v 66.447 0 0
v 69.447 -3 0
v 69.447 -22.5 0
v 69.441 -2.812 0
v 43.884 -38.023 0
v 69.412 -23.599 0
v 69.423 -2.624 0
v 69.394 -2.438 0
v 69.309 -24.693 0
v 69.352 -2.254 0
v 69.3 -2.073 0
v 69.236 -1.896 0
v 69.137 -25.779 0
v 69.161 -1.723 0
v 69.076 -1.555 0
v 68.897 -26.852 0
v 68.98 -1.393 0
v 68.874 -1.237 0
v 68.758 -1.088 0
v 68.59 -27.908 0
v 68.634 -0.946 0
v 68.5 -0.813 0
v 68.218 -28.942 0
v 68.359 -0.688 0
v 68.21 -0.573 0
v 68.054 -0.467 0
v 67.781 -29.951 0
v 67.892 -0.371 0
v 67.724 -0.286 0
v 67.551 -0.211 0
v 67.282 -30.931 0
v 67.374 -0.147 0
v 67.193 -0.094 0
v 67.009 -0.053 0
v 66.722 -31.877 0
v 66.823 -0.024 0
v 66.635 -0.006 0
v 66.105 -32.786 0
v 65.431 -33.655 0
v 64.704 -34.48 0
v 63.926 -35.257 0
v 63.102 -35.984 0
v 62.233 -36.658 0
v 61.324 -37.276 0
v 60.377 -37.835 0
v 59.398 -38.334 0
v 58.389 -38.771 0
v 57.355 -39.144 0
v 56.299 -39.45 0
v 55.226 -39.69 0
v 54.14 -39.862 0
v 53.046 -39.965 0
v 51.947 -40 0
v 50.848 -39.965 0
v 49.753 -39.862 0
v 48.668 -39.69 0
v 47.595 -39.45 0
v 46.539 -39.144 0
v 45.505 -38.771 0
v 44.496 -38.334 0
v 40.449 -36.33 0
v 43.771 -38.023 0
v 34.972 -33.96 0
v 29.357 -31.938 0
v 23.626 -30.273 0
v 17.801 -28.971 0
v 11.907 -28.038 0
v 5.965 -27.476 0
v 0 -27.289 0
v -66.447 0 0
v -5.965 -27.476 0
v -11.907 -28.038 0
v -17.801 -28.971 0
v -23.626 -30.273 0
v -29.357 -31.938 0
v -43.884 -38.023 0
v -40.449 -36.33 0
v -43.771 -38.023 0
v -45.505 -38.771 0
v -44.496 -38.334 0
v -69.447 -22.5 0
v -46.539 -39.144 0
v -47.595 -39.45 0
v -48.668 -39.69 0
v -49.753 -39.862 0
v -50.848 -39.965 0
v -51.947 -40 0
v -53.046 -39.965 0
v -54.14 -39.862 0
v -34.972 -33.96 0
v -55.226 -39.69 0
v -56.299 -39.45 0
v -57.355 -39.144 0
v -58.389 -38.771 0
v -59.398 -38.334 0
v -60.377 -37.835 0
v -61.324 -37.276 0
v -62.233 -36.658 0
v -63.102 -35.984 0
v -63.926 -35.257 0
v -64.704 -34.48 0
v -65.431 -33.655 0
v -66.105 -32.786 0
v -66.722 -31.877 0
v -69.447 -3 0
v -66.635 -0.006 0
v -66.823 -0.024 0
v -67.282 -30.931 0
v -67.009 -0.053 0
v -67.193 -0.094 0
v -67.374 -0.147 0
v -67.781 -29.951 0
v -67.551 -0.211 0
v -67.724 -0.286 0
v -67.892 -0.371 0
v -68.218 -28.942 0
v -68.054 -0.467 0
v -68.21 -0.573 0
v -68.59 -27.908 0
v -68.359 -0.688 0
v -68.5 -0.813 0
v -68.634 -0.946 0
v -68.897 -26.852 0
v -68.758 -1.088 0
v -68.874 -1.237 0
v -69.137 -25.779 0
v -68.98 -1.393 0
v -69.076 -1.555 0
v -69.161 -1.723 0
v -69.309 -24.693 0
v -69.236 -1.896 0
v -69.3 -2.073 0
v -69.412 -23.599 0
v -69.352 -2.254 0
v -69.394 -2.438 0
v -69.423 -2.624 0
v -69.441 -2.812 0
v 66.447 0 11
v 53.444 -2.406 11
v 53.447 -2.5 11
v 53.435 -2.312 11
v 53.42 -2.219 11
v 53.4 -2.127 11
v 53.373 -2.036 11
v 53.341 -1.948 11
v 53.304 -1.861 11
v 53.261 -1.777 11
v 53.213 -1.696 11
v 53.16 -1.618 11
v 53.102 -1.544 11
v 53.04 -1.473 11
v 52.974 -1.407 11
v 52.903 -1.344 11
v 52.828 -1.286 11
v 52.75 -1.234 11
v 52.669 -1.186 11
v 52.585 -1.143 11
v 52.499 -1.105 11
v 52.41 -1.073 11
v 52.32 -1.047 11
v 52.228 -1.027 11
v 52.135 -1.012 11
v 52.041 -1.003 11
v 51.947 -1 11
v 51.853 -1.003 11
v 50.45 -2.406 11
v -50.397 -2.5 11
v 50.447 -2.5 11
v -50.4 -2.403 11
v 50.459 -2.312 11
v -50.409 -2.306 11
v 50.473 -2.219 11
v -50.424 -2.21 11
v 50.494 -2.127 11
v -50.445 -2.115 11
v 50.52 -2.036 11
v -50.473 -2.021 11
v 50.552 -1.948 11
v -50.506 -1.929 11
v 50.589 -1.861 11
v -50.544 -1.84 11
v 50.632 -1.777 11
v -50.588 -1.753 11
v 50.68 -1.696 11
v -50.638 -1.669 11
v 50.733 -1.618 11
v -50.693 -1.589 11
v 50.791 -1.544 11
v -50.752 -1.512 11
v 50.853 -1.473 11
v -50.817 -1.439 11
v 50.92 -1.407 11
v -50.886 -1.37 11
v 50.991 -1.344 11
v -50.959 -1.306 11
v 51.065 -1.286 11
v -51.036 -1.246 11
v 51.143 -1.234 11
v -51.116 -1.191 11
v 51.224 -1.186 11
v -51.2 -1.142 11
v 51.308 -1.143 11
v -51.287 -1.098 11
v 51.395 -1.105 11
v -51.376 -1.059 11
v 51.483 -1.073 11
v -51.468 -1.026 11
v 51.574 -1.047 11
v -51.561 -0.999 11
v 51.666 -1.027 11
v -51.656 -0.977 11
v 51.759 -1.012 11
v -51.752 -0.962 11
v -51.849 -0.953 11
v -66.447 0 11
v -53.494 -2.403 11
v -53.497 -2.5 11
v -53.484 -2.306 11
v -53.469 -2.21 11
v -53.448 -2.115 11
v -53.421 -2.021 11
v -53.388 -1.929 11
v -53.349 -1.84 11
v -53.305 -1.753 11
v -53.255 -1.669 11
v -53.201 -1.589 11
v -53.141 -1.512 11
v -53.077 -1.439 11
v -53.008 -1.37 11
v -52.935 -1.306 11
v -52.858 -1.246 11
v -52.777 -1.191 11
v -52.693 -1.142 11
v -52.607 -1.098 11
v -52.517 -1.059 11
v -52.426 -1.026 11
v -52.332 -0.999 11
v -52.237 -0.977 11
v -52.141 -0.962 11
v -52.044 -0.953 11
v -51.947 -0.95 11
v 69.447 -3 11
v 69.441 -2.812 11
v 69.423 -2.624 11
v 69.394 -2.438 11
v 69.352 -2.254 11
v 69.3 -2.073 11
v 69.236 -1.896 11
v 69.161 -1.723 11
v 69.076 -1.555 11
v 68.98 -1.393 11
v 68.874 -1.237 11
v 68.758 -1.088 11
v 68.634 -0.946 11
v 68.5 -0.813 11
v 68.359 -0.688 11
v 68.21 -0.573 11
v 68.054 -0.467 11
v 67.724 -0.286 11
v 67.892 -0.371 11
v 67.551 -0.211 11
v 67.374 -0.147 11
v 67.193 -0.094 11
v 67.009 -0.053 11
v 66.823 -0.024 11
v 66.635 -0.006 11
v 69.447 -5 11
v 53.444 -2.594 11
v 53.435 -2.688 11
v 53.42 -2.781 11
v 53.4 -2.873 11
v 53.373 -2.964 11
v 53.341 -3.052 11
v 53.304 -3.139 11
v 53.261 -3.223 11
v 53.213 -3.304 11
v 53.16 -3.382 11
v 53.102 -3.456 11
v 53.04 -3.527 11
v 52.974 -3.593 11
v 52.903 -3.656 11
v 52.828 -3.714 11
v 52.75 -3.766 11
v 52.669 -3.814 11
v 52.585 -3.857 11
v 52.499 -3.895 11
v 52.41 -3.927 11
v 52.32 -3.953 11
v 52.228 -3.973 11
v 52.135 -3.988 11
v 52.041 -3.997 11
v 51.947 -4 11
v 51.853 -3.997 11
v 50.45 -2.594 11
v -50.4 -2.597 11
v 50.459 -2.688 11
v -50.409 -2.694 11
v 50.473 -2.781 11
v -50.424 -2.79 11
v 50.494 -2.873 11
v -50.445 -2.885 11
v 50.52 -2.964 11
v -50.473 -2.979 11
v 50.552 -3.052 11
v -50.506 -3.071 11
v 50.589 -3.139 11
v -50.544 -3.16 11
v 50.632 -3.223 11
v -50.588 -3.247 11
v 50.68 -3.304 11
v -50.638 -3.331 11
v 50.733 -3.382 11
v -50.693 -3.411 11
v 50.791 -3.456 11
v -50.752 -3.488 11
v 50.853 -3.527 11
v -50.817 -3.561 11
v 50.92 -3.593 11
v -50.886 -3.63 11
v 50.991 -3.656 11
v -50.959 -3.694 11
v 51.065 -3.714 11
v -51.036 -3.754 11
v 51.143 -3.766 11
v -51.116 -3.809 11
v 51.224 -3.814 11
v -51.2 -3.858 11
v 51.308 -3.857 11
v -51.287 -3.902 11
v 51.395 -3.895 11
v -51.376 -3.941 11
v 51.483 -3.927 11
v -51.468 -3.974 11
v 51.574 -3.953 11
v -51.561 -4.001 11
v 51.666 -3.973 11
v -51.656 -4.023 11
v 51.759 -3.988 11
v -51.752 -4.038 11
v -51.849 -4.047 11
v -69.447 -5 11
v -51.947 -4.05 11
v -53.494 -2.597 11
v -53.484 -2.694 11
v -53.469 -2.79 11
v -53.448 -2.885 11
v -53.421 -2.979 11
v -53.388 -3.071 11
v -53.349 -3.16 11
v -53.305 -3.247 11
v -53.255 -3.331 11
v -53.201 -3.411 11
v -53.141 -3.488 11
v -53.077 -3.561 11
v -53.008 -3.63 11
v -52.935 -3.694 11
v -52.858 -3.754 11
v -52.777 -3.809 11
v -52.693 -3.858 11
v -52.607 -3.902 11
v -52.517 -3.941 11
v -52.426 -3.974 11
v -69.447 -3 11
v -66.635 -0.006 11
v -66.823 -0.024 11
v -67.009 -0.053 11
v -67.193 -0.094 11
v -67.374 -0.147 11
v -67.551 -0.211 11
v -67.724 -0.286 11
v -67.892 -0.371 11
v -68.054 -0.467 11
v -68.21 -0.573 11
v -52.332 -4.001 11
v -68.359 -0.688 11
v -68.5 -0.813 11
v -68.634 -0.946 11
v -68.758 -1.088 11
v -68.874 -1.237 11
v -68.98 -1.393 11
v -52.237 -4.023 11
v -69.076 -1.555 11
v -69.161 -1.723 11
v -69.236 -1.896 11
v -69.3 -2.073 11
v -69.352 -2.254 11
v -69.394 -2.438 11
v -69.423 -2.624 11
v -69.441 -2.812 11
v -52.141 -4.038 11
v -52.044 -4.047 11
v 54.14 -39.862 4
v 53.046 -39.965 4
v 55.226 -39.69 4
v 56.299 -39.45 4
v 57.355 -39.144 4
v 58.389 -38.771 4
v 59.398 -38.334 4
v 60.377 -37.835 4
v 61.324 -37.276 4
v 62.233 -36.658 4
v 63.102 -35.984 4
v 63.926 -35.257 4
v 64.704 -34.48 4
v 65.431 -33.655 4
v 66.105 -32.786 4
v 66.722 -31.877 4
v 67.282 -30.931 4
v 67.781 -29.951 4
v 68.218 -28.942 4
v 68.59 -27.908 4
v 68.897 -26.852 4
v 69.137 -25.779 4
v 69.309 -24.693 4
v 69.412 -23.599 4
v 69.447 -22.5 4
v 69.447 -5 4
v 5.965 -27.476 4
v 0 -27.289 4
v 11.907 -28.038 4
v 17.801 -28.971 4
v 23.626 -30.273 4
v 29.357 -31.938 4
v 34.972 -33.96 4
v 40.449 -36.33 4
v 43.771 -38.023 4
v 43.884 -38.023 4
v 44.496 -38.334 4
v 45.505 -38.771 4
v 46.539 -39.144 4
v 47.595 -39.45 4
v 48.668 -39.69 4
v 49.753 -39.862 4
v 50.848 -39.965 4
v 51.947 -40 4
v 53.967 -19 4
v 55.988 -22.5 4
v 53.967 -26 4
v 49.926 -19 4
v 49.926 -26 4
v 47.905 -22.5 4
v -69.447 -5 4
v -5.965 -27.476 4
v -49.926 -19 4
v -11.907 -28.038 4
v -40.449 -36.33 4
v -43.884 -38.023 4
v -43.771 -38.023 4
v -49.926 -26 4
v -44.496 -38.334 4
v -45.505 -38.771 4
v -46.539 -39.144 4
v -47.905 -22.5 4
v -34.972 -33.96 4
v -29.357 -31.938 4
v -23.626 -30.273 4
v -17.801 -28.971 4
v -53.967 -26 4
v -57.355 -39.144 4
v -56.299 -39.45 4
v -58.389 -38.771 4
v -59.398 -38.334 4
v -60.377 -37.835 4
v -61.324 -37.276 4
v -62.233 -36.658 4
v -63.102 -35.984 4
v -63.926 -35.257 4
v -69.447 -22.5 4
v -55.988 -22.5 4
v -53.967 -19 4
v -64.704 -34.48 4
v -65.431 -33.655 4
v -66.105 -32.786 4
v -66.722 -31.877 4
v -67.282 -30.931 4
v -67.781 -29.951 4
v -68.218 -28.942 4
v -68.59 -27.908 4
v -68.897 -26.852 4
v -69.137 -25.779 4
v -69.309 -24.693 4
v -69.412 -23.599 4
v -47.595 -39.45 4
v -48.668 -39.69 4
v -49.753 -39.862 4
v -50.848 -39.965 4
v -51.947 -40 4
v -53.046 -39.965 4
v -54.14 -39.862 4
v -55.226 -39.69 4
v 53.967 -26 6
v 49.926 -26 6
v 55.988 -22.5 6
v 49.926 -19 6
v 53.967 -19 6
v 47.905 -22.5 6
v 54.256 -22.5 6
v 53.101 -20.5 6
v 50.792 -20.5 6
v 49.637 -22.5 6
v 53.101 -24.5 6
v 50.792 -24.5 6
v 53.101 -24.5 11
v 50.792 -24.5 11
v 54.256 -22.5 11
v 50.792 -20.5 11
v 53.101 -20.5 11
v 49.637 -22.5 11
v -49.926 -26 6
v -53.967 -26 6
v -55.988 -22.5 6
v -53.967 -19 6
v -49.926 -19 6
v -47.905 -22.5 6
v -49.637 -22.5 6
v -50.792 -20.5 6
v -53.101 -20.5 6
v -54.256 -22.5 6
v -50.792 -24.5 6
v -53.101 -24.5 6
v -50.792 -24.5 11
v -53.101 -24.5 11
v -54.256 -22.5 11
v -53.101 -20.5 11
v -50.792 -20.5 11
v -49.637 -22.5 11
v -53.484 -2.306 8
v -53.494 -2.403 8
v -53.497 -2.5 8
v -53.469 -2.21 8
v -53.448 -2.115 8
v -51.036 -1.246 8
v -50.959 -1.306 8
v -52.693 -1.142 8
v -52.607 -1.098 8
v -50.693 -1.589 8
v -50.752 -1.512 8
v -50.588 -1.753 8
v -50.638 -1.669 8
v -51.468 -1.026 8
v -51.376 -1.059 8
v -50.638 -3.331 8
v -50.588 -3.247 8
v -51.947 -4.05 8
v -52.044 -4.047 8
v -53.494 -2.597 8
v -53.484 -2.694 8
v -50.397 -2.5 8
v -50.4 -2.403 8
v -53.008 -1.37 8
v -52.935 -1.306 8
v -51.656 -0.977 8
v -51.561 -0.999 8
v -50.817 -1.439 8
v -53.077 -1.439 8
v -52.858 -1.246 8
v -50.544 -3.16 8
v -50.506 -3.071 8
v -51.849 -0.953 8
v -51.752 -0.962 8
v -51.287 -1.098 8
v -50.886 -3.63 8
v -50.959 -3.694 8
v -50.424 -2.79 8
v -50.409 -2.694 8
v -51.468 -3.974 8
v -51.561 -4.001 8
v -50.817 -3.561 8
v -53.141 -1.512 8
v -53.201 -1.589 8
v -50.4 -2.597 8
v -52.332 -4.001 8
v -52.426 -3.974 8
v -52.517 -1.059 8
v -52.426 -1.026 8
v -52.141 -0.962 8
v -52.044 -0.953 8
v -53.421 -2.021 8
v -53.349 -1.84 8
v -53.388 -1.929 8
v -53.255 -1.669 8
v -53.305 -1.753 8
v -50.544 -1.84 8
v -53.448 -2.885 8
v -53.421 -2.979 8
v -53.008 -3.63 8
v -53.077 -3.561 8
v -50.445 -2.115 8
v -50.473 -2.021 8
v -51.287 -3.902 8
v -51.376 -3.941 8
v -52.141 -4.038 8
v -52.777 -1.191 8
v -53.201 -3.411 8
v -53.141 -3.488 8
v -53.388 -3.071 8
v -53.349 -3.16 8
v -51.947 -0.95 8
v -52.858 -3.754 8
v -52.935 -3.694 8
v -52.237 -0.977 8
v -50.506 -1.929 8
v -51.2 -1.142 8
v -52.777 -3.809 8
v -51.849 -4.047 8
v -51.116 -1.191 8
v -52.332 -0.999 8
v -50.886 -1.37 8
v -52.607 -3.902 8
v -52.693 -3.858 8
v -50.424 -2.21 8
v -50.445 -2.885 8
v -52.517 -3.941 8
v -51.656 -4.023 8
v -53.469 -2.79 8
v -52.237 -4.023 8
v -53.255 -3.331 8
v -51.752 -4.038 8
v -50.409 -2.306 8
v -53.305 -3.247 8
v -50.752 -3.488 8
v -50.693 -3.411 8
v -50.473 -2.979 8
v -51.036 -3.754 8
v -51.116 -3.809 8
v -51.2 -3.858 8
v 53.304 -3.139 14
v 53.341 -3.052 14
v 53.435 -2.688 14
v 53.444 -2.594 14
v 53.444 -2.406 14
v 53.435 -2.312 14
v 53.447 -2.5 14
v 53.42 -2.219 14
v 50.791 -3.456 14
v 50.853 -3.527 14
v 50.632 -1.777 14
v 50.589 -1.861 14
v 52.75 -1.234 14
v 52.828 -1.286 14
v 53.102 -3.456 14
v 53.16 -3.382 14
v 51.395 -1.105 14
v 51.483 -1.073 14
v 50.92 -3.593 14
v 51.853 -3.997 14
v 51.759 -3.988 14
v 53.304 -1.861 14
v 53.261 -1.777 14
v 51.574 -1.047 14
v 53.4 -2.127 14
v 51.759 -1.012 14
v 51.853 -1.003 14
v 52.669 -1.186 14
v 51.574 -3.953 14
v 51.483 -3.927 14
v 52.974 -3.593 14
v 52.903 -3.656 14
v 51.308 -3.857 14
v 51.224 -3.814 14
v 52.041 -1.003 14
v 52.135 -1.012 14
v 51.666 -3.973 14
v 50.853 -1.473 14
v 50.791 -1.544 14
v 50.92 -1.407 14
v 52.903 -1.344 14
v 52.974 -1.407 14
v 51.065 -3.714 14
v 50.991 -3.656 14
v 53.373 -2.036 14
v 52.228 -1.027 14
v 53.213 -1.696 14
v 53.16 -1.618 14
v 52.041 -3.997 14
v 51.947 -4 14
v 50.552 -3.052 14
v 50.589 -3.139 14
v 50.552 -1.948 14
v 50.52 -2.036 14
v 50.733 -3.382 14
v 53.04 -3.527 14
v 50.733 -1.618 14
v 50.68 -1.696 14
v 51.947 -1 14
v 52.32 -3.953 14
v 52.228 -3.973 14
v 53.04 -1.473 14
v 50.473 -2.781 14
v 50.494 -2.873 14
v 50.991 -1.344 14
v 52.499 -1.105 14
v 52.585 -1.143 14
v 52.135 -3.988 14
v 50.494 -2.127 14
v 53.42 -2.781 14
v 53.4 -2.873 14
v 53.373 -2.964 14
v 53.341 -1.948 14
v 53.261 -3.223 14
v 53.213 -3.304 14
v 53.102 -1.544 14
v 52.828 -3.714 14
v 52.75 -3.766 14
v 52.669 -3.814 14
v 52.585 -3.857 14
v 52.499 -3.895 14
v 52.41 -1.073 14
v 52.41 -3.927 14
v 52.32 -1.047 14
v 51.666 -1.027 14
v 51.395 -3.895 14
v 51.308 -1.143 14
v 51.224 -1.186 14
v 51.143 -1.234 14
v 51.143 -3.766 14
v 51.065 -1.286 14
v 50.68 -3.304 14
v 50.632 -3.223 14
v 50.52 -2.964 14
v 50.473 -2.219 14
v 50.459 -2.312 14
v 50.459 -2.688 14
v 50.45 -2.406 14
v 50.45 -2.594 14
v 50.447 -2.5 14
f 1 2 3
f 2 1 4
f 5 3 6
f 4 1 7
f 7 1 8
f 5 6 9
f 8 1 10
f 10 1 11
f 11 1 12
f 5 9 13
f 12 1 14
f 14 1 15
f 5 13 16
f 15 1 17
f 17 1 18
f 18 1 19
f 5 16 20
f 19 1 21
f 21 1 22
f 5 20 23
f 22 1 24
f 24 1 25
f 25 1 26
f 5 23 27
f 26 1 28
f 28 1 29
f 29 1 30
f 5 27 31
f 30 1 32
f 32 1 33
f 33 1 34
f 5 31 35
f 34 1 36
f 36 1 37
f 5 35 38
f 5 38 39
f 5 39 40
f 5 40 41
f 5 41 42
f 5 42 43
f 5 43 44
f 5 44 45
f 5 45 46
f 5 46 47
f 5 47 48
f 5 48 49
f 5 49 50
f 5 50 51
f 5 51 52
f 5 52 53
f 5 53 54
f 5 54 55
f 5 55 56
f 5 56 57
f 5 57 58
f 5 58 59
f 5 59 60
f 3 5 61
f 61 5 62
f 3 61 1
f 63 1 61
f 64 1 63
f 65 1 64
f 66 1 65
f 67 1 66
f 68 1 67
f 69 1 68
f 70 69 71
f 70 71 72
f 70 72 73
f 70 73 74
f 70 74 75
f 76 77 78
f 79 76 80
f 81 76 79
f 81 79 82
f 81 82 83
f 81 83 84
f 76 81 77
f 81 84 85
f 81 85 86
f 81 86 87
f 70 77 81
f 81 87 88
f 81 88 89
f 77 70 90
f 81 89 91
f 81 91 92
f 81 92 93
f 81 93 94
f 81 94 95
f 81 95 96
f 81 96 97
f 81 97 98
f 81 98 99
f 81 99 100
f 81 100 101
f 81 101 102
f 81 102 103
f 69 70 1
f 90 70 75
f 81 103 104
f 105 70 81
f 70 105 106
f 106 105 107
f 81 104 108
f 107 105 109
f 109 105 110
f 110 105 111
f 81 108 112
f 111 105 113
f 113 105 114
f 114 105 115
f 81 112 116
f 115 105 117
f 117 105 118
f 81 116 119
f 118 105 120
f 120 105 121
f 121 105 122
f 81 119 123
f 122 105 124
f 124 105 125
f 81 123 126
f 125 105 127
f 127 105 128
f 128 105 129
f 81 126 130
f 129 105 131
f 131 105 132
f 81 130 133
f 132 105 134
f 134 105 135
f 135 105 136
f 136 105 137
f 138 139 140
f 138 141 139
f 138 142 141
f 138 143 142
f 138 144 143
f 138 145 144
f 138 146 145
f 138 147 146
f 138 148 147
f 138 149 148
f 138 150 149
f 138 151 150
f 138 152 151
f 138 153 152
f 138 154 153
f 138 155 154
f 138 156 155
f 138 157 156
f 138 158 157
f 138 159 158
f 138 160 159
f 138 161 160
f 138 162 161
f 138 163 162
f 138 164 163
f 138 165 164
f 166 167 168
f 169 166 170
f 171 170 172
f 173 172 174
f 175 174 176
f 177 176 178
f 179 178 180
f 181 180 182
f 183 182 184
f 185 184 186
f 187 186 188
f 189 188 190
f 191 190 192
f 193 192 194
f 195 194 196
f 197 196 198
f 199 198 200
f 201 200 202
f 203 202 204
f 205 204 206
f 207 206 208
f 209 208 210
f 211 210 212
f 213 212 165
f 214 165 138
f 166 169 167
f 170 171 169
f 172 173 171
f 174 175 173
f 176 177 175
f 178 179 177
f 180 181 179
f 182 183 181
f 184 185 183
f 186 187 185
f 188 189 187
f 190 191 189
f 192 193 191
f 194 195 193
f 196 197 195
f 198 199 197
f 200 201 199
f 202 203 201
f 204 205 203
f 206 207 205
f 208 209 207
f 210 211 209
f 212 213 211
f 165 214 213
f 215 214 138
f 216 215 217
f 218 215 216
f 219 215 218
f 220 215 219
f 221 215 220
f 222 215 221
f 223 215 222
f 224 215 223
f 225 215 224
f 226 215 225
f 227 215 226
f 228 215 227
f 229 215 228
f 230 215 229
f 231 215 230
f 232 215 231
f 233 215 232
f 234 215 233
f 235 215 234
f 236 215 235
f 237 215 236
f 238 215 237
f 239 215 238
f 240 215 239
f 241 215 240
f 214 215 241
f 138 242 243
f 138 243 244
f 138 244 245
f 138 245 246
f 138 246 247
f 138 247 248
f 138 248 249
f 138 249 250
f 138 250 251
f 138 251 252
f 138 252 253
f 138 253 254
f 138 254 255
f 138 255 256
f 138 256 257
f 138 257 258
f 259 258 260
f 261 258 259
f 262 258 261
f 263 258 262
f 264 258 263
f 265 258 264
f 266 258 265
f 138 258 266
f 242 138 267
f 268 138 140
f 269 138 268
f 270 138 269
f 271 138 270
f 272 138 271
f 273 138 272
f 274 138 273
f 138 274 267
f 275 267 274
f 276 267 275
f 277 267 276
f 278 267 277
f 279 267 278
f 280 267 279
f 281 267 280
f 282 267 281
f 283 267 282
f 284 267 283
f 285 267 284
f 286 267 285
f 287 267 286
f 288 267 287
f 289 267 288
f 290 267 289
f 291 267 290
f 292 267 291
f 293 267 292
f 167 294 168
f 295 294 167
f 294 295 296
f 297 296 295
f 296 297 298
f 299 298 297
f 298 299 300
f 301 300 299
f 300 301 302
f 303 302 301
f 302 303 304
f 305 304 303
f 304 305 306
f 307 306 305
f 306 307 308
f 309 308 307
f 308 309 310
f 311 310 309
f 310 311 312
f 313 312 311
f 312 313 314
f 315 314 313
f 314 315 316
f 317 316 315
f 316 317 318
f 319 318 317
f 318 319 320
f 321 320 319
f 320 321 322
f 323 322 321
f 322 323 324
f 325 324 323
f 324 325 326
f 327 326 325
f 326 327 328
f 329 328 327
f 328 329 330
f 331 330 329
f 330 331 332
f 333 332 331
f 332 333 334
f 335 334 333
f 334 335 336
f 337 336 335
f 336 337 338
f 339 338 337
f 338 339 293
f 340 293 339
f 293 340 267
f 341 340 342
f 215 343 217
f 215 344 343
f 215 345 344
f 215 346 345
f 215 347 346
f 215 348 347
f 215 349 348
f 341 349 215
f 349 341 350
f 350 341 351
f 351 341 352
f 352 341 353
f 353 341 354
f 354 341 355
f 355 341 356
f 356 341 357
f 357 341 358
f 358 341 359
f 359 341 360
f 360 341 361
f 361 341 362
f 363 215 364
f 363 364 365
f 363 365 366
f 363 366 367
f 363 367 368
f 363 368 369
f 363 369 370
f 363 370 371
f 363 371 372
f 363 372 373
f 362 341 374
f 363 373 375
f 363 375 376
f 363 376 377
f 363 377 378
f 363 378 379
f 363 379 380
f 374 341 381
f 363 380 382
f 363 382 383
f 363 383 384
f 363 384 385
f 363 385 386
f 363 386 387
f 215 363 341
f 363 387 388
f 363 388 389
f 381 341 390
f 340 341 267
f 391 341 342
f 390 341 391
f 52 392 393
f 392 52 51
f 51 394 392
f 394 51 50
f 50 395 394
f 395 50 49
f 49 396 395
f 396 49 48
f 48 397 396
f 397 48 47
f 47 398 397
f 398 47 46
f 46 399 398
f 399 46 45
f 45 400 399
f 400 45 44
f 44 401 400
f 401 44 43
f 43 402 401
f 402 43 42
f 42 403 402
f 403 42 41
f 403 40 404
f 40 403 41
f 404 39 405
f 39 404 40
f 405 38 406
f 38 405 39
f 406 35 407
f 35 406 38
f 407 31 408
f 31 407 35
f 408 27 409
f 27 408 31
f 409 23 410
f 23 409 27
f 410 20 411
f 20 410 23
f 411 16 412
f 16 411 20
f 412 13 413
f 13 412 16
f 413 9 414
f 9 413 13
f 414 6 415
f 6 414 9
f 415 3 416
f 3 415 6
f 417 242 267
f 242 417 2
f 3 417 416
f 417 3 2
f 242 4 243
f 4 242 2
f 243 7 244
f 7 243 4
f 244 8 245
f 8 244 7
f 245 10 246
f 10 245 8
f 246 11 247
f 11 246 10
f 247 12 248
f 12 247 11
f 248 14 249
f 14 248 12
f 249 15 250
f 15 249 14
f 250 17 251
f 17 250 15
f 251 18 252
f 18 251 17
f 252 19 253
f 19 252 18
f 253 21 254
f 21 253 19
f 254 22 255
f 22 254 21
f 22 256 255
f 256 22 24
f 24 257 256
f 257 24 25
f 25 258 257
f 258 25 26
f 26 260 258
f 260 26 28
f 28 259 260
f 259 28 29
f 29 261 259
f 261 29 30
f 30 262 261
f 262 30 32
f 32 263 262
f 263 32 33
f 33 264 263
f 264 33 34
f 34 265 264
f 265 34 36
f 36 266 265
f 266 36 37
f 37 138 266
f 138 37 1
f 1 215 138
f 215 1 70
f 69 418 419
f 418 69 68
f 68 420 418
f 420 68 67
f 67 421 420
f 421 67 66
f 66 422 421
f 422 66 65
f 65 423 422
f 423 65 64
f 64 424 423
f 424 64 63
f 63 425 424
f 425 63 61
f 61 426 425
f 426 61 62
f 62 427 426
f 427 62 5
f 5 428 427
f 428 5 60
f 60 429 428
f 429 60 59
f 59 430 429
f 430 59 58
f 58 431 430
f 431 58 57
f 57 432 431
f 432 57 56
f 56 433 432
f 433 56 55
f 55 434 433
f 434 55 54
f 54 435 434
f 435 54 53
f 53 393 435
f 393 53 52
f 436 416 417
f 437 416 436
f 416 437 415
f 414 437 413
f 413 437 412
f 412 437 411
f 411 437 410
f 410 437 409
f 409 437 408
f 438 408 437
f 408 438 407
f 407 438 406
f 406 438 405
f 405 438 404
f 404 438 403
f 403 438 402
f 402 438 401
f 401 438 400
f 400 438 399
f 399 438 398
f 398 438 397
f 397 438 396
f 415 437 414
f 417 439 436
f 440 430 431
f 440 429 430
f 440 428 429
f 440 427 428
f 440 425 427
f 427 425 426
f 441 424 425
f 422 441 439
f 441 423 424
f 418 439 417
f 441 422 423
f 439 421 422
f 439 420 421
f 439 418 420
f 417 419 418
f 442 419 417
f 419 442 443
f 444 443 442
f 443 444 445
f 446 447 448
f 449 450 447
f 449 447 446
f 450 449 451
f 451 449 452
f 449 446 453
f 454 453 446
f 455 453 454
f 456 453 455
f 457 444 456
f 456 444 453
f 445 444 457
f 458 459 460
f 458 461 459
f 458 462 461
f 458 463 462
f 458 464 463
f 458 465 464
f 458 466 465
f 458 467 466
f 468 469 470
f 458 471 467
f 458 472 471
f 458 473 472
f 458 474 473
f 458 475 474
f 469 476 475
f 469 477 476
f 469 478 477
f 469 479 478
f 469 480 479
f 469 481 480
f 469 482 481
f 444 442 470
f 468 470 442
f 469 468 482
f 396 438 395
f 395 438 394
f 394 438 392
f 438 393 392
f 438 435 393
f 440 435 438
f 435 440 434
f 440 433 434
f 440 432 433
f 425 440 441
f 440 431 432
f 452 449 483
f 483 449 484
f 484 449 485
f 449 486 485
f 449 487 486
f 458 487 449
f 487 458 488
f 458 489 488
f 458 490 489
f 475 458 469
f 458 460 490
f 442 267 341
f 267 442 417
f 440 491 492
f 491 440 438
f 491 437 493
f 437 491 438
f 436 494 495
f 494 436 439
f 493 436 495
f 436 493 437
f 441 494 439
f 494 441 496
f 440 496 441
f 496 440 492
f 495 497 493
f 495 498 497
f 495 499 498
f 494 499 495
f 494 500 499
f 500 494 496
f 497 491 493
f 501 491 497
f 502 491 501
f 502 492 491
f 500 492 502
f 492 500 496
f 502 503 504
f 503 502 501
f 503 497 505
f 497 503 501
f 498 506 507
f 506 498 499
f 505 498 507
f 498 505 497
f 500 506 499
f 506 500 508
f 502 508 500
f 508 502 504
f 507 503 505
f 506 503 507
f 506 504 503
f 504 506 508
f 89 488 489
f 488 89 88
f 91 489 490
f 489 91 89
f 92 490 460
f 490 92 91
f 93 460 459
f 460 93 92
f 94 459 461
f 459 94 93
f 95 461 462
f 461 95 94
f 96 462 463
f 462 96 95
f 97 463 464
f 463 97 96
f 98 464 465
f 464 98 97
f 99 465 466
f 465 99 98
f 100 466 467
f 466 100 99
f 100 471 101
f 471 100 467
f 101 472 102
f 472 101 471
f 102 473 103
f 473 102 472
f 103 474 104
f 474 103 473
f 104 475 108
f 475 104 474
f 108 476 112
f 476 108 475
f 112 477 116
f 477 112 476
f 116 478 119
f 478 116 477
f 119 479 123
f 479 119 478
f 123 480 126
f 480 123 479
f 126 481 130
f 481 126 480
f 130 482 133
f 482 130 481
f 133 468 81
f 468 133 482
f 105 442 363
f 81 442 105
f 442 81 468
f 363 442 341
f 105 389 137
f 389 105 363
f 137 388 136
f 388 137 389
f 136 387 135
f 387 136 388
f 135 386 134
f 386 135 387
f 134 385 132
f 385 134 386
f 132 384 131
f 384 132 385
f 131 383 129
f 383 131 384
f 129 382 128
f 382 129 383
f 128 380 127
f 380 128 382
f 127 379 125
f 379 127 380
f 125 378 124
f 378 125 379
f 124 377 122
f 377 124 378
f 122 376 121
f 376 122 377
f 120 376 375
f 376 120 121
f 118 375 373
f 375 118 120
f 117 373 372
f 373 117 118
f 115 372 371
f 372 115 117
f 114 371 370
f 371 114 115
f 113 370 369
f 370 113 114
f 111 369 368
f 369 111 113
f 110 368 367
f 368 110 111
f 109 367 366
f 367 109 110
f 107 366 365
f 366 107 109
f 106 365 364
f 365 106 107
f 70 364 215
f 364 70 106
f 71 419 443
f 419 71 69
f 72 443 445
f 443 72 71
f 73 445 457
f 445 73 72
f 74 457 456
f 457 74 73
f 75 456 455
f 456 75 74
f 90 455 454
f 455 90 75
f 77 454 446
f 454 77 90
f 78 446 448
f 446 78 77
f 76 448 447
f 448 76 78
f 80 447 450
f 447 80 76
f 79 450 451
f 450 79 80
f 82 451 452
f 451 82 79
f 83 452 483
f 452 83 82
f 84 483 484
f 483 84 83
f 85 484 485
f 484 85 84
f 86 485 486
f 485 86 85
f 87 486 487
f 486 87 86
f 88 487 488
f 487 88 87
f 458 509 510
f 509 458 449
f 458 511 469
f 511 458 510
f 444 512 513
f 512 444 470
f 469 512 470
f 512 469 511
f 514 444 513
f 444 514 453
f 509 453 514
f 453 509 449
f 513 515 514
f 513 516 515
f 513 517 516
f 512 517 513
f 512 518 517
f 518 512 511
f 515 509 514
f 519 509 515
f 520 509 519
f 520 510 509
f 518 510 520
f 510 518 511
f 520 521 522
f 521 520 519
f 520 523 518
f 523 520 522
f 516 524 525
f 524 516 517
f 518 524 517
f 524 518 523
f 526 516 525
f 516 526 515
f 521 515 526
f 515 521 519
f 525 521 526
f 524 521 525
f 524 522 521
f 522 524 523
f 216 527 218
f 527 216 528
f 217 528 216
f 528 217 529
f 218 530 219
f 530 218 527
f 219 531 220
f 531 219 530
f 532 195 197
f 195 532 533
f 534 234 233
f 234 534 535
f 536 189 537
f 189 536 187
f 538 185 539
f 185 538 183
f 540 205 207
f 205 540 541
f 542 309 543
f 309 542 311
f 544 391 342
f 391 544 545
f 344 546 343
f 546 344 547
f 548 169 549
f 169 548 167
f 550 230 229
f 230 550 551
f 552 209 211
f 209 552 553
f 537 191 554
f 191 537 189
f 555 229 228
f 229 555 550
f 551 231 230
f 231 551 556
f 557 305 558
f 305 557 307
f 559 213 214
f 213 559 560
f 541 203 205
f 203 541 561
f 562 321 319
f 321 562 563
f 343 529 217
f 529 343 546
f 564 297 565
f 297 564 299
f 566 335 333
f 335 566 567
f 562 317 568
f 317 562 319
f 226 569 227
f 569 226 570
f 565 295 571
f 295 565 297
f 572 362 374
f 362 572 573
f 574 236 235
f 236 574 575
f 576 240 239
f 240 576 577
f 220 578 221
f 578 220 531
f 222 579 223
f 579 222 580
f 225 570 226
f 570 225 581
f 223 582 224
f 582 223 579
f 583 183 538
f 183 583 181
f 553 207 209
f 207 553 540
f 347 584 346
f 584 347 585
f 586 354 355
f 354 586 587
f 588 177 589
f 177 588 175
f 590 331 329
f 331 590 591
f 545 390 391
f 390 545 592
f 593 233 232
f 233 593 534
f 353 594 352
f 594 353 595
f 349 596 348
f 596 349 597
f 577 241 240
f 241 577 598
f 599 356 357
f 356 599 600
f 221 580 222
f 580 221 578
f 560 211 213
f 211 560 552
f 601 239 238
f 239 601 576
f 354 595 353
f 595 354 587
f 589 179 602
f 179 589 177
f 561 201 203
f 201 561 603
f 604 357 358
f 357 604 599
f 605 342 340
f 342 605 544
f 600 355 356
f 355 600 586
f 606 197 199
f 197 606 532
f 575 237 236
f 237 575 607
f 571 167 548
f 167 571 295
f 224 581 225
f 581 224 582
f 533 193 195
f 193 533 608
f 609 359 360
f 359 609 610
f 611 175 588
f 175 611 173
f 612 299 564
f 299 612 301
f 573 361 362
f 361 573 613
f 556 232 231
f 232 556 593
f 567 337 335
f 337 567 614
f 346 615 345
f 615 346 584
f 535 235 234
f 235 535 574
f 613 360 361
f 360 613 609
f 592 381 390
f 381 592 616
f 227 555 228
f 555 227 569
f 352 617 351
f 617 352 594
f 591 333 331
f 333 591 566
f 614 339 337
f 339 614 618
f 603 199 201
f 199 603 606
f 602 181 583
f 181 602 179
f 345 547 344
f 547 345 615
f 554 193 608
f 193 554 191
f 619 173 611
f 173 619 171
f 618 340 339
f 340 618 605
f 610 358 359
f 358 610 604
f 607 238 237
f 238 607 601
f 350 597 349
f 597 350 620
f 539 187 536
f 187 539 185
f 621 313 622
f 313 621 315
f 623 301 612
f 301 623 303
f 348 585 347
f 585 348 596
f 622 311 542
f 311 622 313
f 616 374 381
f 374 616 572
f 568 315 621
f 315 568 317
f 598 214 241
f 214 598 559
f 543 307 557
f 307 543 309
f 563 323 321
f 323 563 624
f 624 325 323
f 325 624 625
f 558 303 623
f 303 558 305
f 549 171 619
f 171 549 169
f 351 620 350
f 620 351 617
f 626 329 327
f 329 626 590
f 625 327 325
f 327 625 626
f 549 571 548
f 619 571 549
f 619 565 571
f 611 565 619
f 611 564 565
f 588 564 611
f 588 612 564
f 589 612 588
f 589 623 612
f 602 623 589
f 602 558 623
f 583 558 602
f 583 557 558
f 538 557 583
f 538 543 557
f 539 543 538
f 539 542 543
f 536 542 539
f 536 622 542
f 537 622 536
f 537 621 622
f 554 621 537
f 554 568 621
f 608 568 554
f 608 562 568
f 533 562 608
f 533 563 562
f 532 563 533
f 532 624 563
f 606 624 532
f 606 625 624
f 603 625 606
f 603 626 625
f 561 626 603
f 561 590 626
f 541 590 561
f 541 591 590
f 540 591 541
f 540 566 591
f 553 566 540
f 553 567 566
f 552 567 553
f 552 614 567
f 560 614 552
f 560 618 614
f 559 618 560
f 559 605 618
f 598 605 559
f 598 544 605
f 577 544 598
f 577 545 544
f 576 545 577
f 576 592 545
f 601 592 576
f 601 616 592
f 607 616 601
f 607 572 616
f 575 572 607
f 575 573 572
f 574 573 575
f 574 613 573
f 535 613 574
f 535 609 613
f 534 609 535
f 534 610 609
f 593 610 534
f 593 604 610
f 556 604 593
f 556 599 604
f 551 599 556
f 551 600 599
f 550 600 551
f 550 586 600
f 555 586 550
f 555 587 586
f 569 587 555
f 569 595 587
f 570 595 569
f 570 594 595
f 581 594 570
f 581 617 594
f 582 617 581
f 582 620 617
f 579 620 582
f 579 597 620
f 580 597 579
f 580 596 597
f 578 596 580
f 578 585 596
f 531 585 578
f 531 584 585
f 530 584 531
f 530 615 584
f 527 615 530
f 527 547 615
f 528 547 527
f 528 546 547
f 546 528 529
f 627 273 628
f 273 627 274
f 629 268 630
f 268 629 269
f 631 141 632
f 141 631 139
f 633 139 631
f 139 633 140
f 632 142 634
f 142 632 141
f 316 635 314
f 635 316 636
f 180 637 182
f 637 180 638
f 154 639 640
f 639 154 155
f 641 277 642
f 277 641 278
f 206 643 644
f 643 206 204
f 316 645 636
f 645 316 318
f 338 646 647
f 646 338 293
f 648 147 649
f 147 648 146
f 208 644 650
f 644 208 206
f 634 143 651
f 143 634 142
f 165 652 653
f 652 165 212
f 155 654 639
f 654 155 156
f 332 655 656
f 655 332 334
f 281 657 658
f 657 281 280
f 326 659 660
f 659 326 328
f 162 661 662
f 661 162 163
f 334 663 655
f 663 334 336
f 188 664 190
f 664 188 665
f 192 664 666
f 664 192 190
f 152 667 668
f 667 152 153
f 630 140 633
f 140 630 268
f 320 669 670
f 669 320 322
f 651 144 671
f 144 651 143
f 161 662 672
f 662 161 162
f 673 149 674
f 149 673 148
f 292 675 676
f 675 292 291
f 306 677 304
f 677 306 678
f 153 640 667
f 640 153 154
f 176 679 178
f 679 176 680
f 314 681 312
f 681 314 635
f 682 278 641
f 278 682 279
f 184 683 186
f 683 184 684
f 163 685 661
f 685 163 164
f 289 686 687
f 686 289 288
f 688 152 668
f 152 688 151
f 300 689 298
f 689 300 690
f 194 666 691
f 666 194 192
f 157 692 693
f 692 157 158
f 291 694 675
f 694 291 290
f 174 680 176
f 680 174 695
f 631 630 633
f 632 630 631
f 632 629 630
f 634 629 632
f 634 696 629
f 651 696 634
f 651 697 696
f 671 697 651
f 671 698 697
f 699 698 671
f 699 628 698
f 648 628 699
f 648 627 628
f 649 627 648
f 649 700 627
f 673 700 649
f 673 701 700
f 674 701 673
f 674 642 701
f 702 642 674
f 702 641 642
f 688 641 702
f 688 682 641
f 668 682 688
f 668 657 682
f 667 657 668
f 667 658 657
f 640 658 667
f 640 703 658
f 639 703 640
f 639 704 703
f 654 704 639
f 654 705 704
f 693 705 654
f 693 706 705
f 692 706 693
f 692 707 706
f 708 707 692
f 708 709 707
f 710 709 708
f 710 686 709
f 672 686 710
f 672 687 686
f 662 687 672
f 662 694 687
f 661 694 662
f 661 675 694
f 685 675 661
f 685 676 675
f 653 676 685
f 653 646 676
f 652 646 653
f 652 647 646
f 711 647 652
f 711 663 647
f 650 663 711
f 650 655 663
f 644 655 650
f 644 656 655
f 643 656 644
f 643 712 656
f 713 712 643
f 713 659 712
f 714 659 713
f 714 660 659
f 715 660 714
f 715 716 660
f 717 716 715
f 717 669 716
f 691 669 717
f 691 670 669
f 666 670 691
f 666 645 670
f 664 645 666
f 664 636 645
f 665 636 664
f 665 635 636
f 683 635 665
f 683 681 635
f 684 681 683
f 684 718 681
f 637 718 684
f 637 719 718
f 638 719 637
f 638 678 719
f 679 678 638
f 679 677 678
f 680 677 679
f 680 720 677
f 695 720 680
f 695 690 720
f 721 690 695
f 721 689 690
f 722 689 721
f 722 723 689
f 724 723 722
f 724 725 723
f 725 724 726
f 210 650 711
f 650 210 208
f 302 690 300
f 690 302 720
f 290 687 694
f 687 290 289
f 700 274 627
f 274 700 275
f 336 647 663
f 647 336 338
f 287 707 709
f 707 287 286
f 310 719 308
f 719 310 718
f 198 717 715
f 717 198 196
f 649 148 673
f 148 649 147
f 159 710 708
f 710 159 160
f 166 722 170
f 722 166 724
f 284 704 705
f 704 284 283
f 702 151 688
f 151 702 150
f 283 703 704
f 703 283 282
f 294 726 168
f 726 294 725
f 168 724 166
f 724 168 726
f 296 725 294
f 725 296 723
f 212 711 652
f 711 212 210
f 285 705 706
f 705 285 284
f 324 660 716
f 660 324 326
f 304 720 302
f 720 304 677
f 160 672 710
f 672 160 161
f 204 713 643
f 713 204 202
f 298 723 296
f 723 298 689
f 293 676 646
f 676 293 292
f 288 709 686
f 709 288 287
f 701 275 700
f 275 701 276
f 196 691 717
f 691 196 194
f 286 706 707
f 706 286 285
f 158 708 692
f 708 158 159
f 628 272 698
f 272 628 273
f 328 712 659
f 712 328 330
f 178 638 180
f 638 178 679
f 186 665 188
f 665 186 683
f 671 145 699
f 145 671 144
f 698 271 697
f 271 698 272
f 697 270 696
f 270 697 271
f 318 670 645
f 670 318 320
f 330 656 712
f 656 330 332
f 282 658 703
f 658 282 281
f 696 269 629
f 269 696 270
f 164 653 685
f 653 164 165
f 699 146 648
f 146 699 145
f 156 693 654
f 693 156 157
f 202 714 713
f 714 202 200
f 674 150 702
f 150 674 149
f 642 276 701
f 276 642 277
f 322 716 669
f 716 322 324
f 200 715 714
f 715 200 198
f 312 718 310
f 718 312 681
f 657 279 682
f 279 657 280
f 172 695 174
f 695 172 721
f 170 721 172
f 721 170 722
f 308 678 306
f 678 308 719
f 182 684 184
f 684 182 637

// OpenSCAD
Spooler_Diameter = 200;
Bearing_Diameter = 25;
Bearing_Thickness = 10;
Washer_Size = 3;
Washer_Thickness = 2;
Bearing_Curb = 5;
Corner = 3;
Aperture = 55; // [15:1:100]
ExtraHeight = 5;
Wall_Thickness = 4;
Axis_Metric = 4;
Axis_Type = "hexagon"; // ["hexagon", "circle"]
Pins = true;
Pin_Diameter = 3;
Pin_Tolerance = 0.1;
Pin_Length_Extra = -4;

$fn=100;

bearingRadius = (Bearing_Diameter/2)+Bearing_Curb;

bearingPositionX = sin(Aperture/2)*0.5*(Spooler_Diameter+Bearing_Diameter);
bearingPositionY = cos(Aperture/2)*0.5*(Spooler_Diameter+Bearing_Diameter);

minPos = max(bearingPositionY+bearingRadius,Spooler_Diameter/2)+ExtraHeight;

translate([0, -minPos, 0]) union() {
    holder();
    pin(tolerance=0);

    mirror([1, 0, 0]) difference () {
        holder();
        pin(tolerance=Pin_Tolerance);
    }
}

module pin(tolerance = 0) {
    if (Pins) {
        translate([bearingPositionX, bearingPositionY+bearingRadius+(ExtraHeight/2), Wall_Thickness-Pin_Length_Extra])
            cylinder(h=((Washer_Thickness+Pin_Length_Extra)*2)+Bearing_Thickness, d=Pin_Diameter+tolerance);
    }
}

module holder() {
    union() {

        difference() {
            linear_extrude(height=Wall_Thickness+Washer_Thickness+(Bearing_Thickness/2)) {
                shape();
            }
            translate([-(bearingPositionX+Bearing_Diameter+Bearing_Curb), -Spooler_Diameter, Wall_Thickness])
                cube(size=[2*(bearingPositionX+Bearing_Diameter+Bearing_Curb), Spooler_Diameter+minPos-ExtraHeight, Wall_Thickness+Washer_Thickness+Bearing_Thickness]);
        }

        translate([bearingPositionX, bearingPositionY, Wall_Thickness])
            bearingAxis();
    }
}

module bearingAxis() {
    metricDef = Axis_Type == "hexagon" ? 6 : $fn;
    divisor = Axis_Type == "hexagon" ? sqrt(3) : 2;

    cylinder(r=(Axis_Metric+Washer_Size)/divisor, h=Washer_Thickness, $fn=metricDef);
    translate([0, 0, Washer_Thickness])
        cylinder(r=Axis_Metric/divisor, h=Bearing_Thickness/2, $fn=metricDef);
}

module corners() {
    if (Corner > 0) {
        translate([bearingPositionX+bearingRadius-Corner, minPos-Corner])
            circle(r=Corner);
        translate([bearingPositionX-bearingRadius+Corner, minPos-Corner])
            circle(r=Corner);
    } else {
        l = Bearing_Diameter/10;
        translate([bearingPositionX+bearingRadius, minPos-l])
            square(size=[l, l]);
        translate([bearingPositionX-bearingRadius-l, minPos-l])
            square(size=[l, l]);
    }
}

module shape() {
    difference() {
        union() {
            hull() {
                translate([bearingPositionX, bearingPositionY])
                    circle(r=bearingRadius);
                corners();
            }
        translate([0, bearingPositionY-(bearingRadius*cos(Aperture/2))])
            square([bearingPositionX, minPos+(bearingRadius*(cos(Aperture/2)))-bearingPositionY]);
        }
        circle(r=(Spooler_Diameter/2)-Bearing_Curb);
    }
}
